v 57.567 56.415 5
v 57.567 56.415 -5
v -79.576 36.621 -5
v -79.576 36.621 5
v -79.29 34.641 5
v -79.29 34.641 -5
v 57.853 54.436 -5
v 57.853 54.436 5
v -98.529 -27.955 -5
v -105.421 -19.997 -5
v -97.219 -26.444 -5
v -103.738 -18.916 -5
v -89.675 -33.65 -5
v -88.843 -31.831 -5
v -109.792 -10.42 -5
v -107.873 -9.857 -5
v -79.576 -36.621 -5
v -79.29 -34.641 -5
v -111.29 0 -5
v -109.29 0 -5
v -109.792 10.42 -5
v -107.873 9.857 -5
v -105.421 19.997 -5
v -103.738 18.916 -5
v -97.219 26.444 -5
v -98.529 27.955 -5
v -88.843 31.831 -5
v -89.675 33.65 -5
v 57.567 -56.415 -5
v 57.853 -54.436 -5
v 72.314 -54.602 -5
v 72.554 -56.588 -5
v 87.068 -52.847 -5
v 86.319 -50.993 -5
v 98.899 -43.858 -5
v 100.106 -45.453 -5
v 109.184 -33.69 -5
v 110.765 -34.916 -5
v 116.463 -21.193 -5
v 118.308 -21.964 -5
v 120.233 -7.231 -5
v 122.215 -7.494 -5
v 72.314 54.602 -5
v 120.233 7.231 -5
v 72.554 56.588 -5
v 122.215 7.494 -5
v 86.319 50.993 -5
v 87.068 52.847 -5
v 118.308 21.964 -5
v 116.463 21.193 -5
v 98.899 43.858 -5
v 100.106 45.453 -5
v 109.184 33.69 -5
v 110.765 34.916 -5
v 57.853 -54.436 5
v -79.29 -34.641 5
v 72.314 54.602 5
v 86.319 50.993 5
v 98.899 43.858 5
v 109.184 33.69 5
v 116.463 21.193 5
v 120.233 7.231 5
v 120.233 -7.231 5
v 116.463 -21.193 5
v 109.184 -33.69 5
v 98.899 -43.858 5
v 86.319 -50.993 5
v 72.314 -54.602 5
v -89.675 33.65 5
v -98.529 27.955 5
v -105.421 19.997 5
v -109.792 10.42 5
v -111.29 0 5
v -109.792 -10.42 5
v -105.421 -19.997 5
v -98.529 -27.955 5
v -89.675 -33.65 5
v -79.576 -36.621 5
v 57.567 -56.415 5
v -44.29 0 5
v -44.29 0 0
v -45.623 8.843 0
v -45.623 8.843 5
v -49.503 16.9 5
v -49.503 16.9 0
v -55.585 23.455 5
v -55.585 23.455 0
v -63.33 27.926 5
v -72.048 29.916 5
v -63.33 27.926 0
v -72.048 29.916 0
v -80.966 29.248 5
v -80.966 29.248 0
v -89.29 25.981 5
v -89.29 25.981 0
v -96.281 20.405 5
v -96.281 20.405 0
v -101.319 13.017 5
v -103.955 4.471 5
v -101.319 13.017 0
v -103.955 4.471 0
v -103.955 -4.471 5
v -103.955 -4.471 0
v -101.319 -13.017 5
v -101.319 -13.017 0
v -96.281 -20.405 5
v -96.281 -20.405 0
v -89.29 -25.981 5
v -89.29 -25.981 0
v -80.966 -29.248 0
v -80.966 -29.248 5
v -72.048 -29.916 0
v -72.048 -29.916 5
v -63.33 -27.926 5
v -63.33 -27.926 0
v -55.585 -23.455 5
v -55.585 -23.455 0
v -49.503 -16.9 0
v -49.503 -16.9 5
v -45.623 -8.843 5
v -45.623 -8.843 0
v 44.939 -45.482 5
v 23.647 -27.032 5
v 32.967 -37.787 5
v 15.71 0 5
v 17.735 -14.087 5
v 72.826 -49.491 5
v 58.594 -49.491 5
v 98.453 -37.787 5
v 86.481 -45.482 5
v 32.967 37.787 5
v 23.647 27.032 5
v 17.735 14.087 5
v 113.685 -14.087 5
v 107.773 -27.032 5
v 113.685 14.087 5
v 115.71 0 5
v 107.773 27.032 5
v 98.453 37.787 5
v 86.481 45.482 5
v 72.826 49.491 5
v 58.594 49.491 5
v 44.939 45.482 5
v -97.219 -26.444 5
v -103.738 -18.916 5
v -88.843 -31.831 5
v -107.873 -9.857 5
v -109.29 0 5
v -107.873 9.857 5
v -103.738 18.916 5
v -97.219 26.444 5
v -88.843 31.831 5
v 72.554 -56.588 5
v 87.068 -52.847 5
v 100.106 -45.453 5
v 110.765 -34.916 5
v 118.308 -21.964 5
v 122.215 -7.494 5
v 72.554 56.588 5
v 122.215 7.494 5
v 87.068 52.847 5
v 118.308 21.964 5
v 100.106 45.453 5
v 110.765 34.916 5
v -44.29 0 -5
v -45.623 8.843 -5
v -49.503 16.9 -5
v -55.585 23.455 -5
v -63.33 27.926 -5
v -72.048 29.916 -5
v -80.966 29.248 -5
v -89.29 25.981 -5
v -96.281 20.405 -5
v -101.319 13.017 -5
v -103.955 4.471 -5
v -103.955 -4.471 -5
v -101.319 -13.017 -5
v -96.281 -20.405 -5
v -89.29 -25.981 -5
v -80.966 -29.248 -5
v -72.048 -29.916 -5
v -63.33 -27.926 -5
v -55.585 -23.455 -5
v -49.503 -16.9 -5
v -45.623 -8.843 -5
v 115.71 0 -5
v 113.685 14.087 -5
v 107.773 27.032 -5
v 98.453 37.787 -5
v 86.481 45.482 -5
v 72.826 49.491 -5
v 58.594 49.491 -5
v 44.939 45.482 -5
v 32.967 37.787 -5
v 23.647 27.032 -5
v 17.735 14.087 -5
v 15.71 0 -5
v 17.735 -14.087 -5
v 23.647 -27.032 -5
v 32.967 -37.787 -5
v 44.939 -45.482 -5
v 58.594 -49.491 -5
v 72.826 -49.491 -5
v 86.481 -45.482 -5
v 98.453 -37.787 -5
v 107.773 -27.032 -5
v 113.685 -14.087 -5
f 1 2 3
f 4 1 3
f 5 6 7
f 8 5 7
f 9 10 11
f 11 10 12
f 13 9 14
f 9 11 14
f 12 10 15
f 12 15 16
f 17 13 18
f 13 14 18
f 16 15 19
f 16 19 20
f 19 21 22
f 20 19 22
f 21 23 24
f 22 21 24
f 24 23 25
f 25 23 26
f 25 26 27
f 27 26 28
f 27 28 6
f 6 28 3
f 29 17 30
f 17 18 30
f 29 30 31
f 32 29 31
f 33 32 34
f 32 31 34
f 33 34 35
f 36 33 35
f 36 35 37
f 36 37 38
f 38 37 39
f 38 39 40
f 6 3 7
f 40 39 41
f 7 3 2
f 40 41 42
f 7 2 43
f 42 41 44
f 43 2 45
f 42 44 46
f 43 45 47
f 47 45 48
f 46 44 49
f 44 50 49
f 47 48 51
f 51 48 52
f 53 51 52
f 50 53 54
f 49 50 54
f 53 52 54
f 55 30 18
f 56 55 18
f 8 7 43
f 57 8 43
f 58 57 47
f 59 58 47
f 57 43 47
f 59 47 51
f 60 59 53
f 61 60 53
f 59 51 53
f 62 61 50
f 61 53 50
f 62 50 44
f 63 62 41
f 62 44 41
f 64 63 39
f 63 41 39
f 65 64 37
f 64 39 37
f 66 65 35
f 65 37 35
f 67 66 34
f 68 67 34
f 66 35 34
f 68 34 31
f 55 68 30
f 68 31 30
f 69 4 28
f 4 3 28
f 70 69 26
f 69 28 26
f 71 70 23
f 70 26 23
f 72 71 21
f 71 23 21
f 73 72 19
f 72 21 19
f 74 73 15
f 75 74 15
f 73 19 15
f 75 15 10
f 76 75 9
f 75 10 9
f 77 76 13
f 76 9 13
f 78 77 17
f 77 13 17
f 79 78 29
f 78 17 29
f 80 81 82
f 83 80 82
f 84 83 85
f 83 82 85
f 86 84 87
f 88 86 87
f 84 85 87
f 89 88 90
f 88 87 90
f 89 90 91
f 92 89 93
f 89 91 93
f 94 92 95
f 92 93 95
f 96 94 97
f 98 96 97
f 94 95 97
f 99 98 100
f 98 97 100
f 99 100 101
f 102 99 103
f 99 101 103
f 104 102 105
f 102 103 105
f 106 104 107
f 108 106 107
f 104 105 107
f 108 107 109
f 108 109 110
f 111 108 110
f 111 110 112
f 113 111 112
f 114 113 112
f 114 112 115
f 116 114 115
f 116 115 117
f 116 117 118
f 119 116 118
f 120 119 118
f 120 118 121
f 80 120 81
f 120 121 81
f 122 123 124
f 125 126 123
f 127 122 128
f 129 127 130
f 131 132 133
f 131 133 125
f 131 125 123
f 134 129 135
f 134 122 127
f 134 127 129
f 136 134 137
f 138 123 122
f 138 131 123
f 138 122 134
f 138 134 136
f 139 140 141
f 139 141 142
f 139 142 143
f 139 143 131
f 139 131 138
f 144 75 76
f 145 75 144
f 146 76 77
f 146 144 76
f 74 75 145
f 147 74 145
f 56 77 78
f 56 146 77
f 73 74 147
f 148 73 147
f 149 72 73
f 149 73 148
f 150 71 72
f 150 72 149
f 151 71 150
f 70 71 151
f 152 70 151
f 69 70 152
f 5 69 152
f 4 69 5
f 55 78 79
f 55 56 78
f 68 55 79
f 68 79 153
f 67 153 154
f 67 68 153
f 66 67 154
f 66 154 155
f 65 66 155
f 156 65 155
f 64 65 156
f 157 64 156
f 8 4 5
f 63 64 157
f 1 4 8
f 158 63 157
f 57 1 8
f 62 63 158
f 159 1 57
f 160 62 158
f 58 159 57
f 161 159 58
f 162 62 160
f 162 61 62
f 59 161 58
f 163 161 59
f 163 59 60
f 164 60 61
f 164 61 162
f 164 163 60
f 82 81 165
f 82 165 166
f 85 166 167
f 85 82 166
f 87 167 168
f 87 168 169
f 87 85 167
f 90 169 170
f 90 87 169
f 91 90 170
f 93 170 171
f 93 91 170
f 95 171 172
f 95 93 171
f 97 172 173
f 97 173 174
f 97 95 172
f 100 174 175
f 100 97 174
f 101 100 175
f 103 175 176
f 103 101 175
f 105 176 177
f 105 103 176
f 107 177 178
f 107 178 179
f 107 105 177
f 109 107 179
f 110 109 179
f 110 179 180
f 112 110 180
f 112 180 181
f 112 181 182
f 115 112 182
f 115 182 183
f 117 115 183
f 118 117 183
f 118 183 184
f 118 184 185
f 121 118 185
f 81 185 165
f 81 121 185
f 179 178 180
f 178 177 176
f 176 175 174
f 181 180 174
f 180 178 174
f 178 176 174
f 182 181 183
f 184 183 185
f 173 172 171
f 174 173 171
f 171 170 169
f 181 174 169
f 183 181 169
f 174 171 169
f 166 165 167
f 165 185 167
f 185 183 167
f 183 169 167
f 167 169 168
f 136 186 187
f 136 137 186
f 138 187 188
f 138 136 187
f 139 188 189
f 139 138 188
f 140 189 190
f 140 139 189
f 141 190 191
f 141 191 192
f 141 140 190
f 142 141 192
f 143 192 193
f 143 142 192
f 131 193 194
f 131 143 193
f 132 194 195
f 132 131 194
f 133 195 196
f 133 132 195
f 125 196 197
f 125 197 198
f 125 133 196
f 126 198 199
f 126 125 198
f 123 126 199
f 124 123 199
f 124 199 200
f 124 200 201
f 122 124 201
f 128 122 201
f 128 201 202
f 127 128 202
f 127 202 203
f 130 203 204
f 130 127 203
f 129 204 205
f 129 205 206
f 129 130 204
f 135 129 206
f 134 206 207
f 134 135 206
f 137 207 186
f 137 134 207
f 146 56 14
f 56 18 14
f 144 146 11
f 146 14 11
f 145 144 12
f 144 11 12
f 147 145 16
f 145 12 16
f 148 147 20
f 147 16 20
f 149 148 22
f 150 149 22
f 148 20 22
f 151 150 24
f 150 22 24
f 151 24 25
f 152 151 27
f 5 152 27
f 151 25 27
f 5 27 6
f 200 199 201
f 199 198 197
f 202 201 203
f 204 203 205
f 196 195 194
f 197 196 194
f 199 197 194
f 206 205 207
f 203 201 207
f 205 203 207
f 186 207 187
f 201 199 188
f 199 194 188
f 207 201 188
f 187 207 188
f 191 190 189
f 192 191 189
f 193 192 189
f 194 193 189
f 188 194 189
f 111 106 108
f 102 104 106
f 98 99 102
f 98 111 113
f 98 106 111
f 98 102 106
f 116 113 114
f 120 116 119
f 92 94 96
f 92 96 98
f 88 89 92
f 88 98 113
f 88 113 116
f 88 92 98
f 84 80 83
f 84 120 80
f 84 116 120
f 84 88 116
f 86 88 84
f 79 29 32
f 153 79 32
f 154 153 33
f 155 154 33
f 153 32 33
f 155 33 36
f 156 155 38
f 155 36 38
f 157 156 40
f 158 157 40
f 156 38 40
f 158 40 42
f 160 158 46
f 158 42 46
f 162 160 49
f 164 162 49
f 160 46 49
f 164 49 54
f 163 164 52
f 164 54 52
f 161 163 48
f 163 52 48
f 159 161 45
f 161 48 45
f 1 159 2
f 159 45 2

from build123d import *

# Parameters (mm, degrees)
F0_R     = 30
F0_R_2   = 50
F1_DEPTH = 5


with BuildPart() as f1:
    # F0 (on Top) → F1 (new body, symmetric)
    with BuildSketch(Plane.XY):
        with BuildLine():
            Line((57.56721, 56.415369), (-79.575647, 36.620503))
            ThreePointArc((-79.575647, 36.620503), (-111.289933, 0), (-79.575647, -36.620503))
            Line((-79.575647, -36.620503), (57.56721, -56.415369))
            ThreePointArc((57.56721, -56.415369), (122.710067, 0), (57.56721, 56.415369))
        make_face()
        with BuildLine():
            ThreePointArc((-79.289933, -34.641016), (-109.289933, 0), (-79.289933, 34.641016))
            Line((-79.289933, 34.641016), (57.852924, 54.435883))
            ThreePointArc((57.852924, 54.435883), (120.710067, 0), (57.852924, -54.435883))
            Line((57.852924, -54.435883), (-79.289933, -34.641016))
        make_face(mode=Mode.SUBTRACT)
        with Locations((-74.289933, 0)):
            Circle(F0_R)
        with Locations((65.710067, 0)):
            Circle(F0_R_2)
    extrude(amount=F1_DEPTH, both=True)


solid = f1.part
